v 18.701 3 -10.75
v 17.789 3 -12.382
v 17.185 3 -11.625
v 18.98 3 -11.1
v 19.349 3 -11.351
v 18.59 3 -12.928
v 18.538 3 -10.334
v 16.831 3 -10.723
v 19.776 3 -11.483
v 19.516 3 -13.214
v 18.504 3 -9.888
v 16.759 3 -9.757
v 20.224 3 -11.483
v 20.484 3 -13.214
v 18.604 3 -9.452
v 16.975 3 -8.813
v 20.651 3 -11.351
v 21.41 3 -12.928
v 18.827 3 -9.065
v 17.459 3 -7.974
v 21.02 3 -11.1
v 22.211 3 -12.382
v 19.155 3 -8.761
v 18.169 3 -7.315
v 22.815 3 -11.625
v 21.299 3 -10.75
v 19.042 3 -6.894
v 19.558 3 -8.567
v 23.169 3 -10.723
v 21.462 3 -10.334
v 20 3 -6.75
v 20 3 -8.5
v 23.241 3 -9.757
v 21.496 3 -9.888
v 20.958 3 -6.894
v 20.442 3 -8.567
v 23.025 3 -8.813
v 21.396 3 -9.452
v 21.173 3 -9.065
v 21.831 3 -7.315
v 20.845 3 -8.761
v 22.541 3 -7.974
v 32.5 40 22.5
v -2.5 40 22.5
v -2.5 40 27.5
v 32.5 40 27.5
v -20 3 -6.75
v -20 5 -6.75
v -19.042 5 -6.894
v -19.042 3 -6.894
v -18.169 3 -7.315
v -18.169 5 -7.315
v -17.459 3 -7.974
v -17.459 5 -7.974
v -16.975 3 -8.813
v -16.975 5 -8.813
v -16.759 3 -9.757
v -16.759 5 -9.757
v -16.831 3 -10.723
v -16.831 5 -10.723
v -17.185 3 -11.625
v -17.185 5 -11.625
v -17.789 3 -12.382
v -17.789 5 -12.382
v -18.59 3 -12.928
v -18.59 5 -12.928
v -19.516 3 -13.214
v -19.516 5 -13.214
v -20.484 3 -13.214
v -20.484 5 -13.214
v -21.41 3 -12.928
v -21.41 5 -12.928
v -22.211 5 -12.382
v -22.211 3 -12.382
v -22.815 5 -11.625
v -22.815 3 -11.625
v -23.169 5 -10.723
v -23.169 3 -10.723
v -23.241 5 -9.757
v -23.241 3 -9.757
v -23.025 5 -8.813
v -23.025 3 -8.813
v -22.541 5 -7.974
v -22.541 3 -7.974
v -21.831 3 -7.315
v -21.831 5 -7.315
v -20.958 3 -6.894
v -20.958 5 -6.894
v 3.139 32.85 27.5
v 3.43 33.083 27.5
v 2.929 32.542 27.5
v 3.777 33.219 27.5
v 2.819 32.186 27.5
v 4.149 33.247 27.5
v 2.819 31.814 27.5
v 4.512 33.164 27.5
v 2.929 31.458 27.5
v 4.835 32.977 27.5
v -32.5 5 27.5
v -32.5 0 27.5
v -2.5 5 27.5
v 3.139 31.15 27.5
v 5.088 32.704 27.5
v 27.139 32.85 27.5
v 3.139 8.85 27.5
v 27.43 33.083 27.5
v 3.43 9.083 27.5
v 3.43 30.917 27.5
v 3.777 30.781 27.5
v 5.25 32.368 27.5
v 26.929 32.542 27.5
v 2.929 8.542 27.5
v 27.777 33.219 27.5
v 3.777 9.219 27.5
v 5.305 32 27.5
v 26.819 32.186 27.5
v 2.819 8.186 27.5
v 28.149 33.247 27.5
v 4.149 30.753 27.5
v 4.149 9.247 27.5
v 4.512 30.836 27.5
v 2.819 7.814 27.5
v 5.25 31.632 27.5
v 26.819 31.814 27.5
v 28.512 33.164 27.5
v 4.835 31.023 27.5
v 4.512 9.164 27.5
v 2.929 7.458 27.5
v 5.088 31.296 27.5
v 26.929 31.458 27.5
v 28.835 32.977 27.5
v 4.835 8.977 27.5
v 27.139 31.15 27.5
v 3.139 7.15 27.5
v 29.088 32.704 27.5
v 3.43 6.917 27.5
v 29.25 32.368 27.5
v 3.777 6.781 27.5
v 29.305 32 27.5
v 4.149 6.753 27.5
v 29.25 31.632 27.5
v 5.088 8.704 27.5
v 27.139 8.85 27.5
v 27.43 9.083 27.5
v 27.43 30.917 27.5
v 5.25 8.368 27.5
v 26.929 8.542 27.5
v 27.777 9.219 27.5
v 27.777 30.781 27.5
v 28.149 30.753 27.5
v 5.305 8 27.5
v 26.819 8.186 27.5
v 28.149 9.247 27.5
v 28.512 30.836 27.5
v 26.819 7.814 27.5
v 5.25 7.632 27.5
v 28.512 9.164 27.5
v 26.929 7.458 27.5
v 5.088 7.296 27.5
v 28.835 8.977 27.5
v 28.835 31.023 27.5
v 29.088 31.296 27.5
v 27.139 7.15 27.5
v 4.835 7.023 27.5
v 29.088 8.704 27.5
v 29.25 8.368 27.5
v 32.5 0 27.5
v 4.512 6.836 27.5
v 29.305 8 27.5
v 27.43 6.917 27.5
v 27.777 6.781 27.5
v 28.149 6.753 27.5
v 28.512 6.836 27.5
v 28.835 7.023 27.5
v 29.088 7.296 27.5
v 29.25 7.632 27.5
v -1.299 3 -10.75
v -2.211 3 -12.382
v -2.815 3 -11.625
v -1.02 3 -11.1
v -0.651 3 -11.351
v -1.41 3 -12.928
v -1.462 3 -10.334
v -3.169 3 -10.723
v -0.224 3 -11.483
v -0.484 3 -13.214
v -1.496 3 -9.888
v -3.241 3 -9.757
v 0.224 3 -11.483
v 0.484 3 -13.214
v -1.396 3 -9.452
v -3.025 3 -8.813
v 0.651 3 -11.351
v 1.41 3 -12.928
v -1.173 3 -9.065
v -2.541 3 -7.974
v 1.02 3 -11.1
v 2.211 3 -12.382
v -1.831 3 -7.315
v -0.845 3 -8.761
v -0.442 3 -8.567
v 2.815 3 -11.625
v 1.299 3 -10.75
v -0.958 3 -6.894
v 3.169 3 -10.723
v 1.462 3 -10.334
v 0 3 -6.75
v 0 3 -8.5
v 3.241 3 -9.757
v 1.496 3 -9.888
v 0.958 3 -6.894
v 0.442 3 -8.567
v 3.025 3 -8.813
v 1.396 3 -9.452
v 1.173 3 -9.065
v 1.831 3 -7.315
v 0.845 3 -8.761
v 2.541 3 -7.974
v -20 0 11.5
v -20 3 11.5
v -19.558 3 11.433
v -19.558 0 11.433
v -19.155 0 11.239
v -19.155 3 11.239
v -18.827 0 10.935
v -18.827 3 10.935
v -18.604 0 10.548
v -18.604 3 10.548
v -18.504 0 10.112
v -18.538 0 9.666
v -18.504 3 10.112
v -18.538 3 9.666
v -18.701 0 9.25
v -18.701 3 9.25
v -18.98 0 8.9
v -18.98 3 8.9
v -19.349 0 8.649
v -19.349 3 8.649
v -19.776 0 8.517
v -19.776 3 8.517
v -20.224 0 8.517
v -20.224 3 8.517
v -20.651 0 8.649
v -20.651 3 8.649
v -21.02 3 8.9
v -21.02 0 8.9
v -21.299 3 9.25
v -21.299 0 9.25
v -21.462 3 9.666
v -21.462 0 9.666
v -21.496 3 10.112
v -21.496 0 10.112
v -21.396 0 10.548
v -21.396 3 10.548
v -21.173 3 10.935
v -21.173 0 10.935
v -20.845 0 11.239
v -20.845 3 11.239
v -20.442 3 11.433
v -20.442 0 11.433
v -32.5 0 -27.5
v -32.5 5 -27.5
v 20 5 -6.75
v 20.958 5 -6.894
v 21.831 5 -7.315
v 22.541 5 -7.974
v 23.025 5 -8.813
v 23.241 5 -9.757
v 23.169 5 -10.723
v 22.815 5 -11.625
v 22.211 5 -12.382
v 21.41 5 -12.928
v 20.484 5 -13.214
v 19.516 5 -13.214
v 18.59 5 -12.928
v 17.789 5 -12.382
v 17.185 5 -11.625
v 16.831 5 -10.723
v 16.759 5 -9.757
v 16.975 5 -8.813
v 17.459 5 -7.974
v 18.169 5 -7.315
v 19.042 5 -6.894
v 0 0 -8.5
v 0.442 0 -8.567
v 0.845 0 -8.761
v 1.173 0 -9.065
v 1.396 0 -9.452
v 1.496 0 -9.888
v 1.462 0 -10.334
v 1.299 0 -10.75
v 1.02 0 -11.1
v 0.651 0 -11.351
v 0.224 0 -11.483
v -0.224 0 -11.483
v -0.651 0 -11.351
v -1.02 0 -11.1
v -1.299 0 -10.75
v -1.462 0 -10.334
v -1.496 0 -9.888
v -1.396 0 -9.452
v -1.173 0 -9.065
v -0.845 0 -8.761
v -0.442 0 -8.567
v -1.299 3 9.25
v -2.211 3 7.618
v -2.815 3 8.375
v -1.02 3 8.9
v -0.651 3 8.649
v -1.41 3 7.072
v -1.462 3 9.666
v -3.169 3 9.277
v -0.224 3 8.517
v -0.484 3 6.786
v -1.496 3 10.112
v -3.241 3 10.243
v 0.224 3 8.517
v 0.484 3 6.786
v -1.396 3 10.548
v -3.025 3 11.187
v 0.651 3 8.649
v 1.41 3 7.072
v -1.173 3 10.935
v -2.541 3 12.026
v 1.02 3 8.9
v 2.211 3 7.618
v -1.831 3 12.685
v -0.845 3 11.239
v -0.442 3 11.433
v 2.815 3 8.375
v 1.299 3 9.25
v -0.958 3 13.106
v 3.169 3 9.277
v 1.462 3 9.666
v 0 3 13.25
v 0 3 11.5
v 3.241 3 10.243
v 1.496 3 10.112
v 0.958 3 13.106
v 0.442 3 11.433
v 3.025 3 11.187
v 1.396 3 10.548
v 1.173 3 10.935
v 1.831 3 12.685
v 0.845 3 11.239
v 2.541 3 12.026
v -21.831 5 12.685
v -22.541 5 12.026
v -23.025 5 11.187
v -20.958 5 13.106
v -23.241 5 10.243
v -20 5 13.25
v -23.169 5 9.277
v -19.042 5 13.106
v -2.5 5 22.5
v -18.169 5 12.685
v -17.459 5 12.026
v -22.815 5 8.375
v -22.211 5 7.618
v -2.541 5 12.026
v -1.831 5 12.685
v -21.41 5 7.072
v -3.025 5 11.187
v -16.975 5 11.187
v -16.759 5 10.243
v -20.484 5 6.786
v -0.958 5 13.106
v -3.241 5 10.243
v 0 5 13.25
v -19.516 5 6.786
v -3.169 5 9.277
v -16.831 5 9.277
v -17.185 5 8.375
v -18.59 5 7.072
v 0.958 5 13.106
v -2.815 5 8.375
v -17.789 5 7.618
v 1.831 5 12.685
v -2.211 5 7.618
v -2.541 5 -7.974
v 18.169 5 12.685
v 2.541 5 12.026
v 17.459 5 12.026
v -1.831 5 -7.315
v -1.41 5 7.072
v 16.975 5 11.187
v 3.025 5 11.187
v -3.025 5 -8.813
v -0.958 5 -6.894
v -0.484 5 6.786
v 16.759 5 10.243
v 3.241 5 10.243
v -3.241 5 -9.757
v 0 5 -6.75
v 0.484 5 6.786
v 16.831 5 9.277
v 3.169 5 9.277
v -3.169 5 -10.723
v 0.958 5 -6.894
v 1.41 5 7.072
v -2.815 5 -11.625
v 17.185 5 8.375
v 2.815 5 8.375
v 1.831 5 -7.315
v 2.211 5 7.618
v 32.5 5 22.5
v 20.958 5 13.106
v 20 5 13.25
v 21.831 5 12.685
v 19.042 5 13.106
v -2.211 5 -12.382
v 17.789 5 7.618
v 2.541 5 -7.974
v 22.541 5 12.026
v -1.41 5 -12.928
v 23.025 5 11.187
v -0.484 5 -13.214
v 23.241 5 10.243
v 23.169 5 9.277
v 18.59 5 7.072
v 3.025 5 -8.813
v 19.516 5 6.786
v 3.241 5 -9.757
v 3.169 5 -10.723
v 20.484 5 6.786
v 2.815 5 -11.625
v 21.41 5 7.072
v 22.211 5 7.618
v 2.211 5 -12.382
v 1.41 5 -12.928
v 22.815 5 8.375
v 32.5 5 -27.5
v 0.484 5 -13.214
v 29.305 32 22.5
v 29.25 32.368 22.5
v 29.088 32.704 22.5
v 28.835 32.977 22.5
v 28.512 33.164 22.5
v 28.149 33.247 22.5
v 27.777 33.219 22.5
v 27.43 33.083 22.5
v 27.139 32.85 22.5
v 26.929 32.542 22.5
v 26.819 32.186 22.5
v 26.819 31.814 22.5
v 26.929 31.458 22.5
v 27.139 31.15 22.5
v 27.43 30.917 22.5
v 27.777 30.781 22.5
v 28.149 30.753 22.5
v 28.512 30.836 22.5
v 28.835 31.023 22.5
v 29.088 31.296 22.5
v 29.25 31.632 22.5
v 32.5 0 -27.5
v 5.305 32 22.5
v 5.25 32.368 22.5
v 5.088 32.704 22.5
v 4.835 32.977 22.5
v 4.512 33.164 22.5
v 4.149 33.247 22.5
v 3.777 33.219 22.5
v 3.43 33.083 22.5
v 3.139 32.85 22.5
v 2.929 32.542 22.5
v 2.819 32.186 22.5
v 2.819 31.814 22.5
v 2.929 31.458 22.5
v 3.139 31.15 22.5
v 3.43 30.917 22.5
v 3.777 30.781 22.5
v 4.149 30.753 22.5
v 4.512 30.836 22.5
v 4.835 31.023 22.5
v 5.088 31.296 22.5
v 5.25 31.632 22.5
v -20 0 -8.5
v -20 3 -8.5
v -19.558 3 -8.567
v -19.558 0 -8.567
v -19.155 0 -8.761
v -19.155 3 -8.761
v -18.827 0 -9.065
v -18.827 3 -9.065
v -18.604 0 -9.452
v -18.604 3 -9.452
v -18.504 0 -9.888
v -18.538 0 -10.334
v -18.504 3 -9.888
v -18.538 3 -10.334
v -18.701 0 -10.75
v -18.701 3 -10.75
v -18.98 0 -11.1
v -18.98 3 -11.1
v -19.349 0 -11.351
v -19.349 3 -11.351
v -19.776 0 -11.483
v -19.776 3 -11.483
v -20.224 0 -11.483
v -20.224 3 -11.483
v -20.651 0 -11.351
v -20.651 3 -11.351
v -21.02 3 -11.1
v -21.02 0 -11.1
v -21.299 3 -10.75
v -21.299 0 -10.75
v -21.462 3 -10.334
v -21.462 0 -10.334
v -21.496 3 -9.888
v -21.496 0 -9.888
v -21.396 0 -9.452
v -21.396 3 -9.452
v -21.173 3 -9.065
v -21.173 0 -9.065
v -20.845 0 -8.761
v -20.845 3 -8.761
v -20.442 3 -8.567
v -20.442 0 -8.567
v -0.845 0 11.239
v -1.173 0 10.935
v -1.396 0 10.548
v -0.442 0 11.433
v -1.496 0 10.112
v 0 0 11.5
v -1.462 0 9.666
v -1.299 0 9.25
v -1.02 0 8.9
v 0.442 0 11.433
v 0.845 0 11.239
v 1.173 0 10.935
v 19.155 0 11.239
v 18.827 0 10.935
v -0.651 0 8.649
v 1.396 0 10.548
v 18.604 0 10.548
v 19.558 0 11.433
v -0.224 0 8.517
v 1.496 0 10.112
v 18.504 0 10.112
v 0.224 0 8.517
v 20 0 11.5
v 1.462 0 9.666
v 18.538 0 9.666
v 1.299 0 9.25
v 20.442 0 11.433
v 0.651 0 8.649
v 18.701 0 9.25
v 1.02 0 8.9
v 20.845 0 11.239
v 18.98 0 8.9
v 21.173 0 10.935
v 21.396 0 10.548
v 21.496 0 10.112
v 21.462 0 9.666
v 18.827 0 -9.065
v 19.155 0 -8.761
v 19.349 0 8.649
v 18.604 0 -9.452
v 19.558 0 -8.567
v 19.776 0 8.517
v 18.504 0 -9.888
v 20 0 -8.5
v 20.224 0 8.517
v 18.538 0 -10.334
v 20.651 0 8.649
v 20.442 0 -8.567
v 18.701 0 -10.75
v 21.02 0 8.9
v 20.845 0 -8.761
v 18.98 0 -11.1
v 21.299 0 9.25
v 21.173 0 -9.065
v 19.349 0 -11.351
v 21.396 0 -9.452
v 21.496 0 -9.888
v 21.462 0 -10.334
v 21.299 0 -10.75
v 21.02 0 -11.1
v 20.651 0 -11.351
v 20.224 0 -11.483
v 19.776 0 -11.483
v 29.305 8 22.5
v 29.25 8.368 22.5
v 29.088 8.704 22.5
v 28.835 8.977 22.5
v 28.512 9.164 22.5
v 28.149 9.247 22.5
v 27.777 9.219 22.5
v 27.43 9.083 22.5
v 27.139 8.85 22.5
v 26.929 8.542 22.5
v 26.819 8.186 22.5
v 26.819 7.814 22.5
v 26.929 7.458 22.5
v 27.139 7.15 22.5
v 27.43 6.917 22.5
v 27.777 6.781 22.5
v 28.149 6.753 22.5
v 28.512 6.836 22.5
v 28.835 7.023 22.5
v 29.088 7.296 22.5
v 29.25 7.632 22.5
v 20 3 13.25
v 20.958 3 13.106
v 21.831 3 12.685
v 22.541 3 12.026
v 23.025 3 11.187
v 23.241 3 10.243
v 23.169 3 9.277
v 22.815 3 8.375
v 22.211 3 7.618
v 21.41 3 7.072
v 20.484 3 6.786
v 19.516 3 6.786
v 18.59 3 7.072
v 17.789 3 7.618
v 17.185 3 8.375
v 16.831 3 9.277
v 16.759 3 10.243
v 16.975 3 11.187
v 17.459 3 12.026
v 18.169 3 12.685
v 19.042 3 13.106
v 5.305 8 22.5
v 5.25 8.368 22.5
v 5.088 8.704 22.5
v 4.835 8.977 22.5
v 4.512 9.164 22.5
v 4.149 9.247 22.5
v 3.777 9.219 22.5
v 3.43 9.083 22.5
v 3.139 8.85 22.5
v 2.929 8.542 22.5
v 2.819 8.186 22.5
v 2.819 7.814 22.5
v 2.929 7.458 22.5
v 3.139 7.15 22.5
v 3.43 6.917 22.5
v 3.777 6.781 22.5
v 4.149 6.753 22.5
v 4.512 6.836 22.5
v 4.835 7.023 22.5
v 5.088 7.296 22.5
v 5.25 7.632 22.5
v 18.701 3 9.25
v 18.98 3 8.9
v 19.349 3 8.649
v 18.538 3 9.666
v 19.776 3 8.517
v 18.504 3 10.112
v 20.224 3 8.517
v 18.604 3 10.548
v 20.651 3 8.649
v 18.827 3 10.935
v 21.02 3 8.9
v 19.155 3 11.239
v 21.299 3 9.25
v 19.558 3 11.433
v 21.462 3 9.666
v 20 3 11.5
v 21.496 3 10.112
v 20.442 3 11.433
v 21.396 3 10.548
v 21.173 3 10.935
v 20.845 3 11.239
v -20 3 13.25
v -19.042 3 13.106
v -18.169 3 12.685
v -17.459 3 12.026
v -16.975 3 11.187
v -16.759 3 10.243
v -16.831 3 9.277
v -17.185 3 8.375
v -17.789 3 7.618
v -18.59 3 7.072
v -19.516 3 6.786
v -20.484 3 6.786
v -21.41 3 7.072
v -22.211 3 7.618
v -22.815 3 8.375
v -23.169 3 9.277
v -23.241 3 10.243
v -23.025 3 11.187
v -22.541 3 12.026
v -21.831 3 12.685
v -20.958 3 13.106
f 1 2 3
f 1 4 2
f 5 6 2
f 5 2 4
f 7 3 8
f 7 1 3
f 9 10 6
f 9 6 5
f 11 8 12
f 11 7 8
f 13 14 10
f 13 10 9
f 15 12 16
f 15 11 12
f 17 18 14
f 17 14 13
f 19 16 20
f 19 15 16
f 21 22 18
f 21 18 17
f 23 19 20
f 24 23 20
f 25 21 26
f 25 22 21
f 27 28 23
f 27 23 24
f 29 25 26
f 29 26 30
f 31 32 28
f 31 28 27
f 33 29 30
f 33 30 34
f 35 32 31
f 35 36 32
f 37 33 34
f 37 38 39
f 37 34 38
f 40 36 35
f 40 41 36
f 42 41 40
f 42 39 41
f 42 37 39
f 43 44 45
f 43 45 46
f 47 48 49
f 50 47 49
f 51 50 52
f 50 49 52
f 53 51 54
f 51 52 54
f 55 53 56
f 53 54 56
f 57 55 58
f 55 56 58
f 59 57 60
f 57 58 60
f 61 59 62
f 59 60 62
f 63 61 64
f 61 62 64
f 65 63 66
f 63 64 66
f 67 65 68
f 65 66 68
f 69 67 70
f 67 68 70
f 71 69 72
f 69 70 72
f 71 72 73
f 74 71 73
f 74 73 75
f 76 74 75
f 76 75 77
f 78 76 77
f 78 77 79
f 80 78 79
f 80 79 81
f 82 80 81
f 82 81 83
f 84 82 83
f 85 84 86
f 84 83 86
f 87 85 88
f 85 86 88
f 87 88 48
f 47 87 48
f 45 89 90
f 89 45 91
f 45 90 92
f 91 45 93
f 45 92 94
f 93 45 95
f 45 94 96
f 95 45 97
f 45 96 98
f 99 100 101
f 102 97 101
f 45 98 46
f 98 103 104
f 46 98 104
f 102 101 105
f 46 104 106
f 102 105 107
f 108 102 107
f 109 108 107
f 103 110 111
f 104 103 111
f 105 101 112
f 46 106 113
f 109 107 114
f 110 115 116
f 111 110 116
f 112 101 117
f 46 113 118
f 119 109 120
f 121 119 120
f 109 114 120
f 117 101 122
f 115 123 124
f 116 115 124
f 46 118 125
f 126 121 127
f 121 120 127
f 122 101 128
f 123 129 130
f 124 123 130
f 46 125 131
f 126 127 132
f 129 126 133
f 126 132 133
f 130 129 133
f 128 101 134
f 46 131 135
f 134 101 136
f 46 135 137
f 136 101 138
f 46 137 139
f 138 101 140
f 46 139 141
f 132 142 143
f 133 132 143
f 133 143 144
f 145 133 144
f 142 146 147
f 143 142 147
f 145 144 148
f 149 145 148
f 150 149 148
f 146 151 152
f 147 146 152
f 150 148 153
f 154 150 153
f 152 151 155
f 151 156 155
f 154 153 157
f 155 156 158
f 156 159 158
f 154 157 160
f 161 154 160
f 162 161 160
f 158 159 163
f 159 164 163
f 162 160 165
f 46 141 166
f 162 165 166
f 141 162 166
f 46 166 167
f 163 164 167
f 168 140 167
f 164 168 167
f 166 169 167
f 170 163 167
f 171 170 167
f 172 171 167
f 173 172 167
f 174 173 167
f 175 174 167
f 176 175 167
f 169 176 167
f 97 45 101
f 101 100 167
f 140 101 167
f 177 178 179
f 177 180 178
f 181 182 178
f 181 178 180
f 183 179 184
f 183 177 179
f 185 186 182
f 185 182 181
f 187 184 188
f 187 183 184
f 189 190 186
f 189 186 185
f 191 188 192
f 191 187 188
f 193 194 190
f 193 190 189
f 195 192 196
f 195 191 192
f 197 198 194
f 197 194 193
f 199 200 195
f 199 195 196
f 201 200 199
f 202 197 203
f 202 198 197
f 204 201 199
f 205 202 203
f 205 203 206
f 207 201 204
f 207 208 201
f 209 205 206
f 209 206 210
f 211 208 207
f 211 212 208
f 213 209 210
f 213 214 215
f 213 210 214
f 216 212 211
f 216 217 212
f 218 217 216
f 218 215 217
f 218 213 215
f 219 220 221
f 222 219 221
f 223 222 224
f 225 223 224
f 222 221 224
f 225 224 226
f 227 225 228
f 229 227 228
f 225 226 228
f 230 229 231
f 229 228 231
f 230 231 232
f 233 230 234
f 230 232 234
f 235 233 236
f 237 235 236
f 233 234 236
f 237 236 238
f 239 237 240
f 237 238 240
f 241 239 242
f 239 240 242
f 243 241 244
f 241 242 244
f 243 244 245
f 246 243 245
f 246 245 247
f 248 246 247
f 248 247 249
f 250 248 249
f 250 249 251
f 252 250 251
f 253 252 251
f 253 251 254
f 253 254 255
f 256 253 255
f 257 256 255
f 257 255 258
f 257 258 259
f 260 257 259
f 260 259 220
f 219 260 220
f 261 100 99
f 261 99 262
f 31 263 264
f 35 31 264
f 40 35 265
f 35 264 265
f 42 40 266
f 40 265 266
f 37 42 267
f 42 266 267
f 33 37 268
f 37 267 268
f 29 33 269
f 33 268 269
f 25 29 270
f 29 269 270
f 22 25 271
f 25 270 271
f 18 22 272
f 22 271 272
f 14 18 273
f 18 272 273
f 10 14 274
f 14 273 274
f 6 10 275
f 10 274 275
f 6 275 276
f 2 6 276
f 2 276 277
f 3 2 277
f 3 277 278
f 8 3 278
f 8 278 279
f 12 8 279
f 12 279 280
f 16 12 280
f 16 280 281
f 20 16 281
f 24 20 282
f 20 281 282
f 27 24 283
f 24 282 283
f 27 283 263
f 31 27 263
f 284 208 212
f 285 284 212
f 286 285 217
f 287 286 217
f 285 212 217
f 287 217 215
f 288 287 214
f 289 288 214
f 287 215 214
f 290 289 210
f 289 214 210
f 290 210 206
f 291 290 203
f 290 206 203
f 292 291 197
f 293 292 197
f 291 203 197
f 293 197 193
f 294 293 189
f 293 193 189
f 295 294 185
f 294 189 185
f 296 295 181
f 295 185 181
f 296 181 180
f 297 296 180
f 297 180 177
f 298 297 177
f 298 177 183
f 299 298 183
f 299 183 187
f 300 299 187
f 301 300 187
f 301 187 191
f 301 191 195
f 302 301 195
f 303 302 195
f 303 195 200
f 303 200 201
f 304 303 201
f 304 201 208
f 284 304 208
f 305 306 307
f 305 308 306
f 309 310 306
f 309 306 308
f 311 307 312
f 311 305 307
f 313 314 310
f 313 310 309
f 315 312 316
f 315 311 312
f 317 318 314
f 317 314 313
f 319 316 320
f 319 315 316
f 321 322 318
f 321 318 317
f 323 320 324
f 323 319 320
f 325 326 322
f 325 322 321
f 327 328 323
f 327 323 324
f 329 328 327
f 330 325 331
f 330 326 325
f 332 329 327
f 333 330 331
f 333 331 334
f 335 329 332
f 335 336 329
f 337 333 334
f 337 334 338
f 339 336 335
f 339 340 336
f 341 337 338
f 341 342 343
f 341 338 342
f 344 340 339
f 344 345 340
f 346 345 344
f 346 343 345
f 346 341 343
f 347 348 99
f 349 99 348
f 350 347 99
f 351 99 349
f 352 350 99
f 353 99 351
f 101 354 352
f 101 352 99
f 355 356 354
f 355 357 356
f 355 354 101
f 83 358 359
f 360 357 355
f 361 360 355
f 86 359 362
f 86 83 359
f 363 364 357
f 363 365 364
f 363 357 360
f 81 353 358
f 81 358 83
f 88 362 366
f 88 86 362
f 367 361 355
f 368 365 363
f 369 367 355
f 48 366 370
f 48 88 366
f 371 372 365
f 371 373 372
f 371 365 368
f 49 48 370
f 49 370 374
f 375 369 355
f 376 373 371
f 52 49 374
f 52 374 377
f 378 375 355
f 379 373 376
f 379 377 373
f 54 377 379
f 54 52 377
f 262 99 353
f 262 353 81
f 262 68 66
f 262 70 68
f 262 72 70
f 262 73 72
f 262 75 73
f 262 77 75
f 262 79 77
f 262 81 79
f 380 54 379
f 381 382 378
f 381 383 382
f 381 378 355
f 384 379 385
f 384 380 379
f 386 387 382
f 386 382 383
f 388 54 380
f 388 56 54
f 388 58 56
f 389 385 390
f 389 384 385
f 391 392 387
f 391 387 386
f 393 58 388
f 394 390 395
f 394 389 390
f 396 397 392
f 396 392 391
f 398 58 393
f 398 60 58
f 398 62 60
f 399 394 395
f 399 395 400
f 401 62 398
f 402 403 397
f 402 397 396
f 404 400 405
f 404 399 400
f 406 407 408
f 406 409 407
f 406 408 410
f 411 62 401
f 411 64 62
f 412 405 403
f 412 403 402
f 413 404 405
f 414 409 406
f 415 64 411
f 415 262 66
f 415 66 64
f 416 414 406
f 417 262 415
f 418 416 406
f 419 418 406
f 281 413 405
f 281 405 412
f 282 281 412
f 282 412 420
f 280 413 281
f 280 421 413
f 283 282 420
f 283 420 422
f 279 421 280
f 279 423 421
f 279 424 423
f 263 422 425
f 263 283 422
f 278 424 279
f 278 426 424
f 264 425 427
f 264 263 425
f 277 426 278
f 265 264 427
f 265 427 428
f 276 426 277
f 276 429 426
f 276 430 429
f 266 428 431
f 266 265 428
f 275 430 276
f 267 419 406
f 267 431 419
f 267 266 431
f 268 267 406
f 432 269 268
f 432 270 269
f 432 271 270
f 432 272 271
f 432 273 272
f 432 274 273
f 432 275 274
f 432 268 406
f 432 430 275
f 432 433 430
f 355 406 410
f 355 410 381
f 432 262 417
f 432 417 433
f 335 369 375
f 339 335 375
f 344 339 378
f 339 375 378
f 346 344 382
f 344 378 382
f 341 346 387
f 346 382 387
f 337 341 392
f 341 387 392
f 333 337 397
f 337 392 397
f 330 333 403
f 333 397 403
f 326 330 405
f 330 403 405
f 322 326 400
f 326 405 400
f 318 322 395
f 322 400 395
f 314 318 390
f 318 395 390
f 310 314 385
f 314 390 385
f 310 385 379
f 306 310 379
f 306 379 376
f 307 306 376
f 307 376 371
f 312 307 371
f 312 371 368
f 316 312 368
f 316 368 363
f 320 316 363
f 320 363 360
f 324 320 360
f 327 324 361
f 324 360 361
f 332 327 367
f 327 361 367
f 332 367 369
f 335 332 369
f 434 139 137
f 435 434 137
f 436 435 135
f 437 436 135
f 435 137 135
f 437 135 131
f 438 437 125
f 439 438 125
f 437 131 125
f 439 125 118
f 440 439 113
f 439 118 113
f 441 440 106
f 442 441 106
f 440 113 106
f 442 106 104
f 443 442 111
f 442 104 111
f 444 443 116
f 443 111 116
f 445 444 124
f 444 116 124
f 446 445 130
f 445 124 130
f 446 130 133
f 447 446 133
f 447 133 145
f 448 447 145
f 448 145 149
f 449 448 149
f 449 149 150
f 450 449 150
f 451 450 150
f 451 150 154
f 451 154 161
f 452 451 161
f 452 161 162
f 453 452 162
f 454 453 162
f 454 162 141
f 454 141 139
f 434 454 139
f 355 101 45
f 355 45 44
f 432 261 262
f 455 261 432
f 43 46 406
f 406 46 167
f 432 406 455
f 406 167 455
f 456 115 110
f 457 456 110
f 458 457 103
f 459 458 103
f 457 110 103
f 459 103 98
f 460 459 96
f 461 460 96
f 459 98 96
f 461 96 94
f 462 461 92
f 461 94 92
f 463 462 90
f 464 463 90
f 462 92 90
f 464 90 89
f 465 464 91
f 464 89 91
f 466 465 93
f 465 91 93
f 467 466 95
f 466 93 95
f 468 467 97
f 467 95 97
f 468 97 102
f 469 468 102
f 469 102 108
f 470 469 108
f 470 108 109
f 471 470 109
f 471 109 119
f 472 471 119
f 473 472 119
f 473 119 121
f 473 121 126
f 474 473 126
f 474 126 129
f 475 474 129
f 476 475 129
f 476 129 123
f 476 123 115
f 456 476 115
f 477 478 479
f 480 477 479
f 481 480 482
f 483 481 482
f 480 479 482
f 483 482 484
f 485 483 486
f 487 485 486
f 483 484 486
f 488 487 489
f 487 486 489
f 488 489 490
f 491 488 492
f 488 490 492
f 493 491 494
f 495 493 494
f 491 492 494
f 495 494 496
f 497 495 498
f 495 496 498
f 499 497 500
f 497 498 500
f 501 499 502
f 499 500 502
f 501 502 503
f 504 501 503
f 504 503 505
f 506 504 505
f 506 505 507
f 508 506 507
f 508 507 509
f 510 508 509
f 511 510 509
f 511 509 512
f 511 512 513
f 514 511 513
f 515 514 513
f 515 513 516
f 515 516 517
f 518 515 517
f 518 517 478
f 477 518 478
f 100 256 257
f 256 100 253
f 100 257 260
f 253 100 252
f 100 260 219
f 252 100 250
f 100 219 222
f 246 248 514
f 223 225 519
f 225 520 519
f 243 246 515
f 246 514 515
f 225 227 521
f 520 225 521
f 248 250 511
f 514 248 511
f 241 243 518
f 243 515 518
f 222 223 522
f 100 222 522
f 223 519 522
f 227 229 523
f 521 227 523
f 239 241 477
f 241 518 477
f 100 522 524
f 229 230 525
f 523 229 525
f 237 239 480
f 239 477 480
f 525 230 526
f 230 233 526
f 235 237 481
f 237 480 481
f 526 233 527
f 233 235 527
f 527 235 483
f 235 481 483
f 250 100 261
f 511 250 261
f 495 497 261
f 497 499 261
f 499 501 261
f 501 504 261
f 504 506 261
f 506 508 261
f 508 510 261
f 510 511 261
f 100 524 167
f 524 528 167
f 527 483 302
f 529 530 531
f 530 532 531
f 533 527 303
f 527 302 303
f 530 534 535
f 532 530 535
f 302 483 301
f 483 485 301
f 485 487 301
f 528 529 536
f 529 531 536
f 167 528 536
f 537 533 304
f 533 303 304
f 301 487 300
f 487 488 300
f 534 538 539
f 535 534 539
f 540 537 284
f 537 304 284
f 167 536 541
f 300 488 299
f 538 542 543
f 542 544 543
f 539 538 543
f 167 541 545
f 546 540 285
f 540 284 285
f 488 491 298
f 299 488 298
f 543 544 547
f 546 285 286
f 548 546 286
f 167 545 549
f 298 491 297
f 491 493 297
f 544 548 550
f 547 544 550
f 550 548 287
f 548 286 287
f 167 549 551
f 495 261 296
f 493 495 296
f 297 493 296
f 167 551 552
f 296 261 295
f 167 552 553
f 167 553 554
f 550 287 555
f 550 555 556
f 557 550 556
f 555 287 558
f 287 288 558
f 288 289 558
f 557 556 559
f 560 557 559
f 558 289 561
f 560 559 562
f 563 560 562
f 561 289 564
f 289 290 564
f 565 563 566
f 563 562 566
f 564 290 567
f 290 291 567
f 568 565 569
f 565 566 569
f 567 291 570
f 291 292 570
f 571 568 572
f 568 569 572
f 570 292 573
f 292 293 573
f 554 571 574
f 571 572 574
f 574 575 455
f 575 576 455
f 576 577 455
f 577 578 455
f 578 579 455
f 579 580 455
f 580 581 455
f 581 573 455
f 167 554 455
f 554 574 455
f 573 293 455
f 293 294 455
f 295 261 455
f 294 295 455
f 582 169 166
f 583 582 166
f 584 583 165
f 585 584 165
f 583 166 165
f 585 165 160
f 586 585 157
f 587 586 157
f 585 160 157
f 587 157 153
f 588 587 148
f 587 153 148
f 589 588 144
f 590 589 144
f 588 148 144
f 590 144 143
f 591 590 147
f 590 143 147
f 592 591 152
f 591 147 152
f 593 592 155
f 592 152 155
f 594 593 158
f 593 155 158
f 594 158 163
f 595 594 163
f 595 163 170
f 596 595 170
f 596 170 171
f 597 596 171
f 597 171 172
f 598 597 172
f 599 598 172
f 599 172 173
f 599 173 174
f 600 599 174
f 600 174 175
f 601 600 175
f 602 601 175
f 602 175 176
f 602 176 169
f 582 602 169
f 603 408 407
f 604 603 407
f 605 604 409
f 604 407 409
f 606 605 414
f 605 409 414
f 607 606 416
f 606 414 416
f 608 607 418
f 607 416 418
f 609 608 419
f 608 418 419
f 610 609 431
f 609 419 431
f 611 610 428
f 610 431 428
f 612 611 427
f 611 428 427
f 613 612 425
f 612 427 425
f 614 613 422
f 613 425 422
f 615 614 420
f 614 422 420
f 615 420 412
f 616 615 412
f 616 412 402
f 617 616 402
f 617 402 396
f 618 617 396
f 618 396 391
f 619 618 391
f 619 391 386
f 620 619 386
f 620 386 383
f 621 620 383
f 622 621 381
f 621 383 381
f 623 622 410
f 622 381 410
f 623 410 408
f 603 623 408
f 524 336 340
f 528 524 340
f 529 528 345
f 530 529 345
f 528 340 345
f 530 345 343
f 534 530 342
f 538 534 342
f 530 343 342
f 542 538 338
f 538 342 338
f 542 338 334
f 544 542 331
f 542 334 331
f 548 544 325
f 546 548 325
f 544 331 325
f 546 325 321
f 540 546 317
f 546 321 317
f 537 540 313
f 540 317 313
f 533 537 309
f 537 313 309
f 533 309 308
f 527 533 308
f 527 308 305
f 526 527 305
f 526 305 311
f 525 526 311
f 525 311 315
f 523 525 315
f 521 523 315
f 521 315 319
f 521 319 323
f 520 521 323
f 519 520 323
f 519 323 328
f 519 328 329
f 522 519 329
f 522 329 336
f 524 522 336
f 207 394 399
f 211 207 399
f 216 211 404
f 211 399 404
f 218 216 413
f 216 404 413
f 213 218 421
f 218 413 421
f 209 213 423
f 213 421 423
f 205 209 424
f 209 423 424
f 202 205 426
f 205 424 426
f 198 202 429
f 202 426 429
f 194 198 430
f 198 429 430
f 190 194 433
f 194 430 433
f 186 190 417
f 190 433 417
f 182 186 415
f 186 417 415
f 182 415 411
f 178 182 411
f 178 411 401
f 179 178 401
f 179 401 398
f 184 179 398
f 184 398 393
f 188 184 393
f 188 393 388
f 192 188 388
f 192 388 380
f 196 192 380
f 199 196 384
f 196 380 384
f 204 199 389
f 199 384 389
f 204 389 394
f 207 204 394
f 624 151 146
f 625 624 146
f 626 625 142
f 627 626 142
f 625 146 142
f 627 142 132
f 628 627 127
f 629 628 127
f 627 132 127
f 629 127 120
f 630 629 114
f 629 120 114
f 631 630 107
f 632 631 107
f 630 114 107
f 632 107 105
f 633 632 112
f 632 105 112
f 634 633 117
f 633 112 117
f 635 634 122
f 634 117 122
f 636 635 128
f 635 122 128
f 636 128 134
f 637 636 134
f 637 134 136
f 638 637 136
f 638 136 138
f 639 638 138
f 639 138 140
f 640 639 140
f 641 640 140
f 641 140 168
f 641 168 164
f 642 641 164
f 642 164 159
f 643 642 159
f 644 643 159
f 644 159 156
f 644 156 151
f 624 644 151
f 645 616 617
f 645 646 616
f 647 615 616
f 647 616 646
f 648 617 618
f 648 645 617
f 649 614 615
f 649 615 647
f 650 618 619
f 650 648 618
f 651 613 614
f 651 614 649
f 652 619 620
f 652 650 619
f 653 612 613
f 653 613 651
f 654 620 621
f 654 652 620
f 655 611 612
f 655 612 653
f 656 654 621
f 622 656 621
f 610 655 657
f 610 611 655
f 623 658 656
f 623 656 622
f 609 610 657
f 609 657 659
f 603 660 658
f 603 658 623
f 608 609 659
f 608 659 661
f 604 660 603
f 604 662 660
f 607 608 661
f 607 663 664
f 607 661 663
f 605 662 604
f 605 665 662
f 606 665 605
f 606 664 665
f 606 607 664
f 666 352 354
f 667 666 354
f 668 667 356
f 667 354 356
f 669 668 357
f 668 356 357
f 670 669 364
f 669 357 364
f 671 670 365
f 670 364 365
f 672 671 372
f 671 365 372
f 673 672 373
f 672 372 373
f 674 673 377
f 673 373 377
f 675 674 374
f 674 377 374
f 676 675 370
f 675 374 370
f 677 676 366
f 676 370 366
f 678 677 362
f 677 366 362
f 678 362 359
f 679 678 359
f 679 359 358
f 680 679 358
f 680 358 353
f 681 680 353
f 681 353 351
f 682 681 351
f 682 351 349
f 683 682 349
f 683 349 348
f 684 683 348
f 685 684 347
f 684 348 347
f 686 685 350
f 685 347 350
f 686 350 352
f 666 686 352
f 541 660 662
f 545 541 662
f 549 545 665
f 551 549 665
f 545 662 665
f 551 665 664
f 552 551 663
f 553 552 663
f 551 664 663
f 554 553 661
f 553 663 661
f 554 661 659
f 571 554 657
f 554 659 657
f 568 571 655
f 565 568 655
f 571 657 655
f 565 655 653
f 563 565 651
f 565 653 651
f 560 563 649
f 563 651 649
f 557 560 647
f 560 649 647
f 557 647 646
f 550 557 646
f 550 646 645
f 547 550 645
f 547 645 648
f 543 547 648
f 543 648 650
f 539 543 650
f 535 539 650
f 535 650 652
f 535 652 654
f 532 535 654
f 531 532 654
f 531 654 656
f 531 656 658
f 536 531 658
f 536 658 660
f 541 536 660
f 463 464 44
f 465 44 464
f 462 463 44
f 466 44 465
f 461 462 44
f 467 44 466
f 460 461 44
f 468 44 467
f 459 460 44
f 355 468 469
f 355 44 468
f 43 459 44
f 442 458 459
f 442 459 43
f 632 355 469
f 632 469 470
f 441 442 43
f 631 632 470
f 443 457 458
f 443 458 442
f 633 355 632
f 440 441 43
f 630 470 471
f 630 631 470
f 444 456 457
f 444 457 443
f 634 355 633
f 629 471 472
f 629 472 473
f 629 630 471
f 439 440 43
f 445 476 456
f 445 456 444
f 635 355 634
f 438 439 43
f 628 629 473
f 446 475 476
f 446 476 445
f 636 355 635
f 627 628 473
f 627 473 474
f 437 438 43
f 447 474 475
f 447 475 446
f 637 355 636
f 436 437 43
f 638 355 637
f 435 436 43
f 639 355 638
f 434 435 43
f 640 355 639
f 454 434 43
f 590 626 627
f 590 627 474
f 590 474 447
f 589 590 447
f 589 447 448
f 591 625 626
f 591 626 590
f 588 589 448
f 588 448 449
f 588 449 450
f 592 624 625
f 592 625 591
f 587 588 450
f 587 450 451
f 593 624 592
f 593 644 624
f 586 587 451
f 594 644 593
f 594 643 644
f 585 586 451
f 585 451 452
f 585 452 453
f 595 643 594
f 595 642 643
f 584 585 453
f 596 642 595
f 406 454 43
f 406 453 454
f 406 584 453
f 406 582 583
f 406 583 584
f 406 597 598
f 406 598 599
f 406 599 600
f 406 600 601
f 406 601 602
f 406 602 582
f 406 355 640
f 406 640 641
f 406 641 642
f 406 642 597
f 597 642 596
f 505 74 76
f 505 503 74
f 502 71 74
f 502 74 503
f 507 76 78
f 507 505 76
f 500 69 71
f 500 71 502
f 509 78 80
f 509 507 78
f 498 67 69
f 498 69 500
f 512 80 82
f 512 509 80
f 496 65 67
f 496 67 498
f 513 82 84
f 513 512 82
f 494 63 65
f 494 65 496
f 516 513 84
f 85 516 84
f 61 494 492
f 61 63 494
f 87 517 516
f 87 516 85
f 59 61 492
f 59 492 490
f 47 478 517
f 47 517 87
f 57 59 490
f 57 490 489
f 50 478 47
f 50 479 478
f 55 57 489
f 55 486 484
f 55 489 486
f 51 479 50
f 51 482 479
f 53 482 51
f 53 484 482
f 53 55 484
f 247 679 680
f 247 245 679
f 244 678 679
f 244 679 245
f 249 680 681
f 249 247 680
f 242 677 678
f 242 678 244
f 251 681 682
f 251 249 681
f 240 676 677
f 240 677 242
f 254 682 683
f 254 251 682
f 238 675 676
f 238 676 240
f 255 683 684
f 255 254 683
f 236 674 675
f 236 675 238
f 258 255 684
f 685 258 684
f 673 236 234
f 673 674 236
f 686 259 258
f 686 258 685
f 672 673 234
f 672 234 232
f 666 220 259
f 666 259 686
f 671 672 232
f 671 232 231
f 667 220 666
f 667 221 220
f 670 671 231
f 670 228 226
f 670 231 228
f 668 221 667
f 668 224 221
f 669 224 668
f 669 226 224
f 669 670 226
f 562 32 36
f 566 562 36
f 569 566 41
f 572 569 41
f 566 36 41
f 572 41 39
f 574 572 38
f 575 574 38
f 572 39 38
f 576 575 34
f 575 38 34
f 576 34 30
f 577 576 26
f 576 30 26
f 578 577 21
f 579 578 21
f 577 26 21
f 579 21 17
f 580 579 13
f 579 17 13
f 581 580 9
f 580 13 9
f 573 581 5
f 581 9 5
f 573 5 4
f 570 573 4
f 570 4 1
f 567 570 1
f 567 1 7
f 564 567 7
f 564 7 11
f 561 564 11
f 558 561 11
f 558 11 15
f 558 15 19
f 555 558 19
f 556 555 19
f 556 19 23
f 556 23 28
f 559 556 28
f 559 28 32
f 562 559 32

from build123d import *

# Parameters (mm, degrees)
SKETCH1_W            = 65
SKETCH1_H            = 55
BOSS_EXTRUDE1_DEPTH  = 5
SKETCH2_R            = 1.5
CUT_EXTRUDE1_DEPTH   = 5
SKETCH3_R            = 3.25
CUT_EXTRUDE2_DEPTH   = 2
LPATTERN1_COUNT      = 2
LPATTERN1_PITCH      = 20
LPATTERN1_COUNT_DIR2 = 3
LPATTERN1_PITCH_DIR2 = 20
SKETCH5_W            = 35
SKETCH5_H            = 5
BOSS_EXTRUDE2_DEPTH  = 35
SKETCH6_R            = 1.25
CUT_EXTRUDE3_DEPTH   = 35


with BuildPart() as part:
    # Sketch1 → Boss-Extrude1 (new body)
    with BuildSketch(Plane(origin=(0, 0, 0), x_dir=(1, 0, 0), z_dir=(0, 1, 0))):
        Rectangle(SKETCH1_W, SKETCH1_H)
    extrude(amount=BOSS_EXTRUDE1_DEPTH)

    # Sketch2 → Cut-Extrude1 (cut)
    with BuildSketch(Plane(origin=(0, 5, 0), x_dir=(1, 0, 0), z_dir=(0, 1, 0))):
        with Locations(Location((-20, 10, 0), (0, 0, 270))):
            Circle(SKETCH2_R)
        with Locations(Location((0, 10, 0), (0, 0, 270))):
            Circle(SKETCH2_R)
        with Locations(Location((20, 10, 0), (0, 0, 270))):
            Circle(SKETCH2_R)
        with Locations(Location((-20, -10, 0), (0, 0, 270))):
            Circle(SKETCH2_R)
        with Locations(Location((0, -10, 0), (0, 0, 270))):
            Circle(SKETCH2_R)
        with Locations(Location((20, -10, 0), (0, 0, 270))):
            Circle(SKETCH2_R)
    extrude(amount=-CUT_EXTRUDE1_DEPTH, mode=Mode.SUBTRACT)

    # Sketch3 → Cut-Extrude2 (cut)
    with BuildSketch(Plane(origin=(0, 5, 0), x_dir=(1, 0, 0), z_dir=(0, 1, 0))):
        with Locations(Location((-20, 10, 0), (0, 0, 270))):
            Circle(SKETCH3_R)
    cut_extrude2 = extrude(amount=-CUT_EXTRUDE2_DEPTH, mode=Mode.SUBTRACT)

    # LPattern1: Cut-Extrude2 2 × 3
    with Locations(*[(j * LPATTERN1_PITCH_DIR2, 0, i * LPATTERN1_PITCH) for i in range(LPATTERN1_COUNT) for j in range(LPATTERN1_COUNT_DIR2) if (i, j) != (0, 0)]):
        add(cut_extrude2, mode=Mode.SUBTRACT)

    # Sketch5 → Boss-Extrude2 (add)
    with BuildSketch(Plane(origin=(0, 5, 0), x_dir=(1, 0, 0), z_dir=(0, 1, 0))):
        with Locations((15, -25)):
            Rectangle(SKETCH5_W, SKETCH5_H)
    extrude(amount=BOSS_EXTRUDE2_DEPTH)

    # Sketch6 → Cut-Extrude3 (cut)
    with BuildSketch(Plane.XY.offset(27.5)):
        with Locations((4.055342901, 32)):
            Circle(SKETCH6_R)
        with Locations((4.055342901, 8)):
            Circle(SKETCH6_R)
        with Locations((28.055342901, 32)):
            Circle(SKETCH6_R)
        with Locations((28.055342901, 8)):
            Circle(SKETCH6_R)
    extrude(amount=-CUT_EXTRUDE3_DEPTH, mode=Mode.SUBTRACT)


solid = part.part
